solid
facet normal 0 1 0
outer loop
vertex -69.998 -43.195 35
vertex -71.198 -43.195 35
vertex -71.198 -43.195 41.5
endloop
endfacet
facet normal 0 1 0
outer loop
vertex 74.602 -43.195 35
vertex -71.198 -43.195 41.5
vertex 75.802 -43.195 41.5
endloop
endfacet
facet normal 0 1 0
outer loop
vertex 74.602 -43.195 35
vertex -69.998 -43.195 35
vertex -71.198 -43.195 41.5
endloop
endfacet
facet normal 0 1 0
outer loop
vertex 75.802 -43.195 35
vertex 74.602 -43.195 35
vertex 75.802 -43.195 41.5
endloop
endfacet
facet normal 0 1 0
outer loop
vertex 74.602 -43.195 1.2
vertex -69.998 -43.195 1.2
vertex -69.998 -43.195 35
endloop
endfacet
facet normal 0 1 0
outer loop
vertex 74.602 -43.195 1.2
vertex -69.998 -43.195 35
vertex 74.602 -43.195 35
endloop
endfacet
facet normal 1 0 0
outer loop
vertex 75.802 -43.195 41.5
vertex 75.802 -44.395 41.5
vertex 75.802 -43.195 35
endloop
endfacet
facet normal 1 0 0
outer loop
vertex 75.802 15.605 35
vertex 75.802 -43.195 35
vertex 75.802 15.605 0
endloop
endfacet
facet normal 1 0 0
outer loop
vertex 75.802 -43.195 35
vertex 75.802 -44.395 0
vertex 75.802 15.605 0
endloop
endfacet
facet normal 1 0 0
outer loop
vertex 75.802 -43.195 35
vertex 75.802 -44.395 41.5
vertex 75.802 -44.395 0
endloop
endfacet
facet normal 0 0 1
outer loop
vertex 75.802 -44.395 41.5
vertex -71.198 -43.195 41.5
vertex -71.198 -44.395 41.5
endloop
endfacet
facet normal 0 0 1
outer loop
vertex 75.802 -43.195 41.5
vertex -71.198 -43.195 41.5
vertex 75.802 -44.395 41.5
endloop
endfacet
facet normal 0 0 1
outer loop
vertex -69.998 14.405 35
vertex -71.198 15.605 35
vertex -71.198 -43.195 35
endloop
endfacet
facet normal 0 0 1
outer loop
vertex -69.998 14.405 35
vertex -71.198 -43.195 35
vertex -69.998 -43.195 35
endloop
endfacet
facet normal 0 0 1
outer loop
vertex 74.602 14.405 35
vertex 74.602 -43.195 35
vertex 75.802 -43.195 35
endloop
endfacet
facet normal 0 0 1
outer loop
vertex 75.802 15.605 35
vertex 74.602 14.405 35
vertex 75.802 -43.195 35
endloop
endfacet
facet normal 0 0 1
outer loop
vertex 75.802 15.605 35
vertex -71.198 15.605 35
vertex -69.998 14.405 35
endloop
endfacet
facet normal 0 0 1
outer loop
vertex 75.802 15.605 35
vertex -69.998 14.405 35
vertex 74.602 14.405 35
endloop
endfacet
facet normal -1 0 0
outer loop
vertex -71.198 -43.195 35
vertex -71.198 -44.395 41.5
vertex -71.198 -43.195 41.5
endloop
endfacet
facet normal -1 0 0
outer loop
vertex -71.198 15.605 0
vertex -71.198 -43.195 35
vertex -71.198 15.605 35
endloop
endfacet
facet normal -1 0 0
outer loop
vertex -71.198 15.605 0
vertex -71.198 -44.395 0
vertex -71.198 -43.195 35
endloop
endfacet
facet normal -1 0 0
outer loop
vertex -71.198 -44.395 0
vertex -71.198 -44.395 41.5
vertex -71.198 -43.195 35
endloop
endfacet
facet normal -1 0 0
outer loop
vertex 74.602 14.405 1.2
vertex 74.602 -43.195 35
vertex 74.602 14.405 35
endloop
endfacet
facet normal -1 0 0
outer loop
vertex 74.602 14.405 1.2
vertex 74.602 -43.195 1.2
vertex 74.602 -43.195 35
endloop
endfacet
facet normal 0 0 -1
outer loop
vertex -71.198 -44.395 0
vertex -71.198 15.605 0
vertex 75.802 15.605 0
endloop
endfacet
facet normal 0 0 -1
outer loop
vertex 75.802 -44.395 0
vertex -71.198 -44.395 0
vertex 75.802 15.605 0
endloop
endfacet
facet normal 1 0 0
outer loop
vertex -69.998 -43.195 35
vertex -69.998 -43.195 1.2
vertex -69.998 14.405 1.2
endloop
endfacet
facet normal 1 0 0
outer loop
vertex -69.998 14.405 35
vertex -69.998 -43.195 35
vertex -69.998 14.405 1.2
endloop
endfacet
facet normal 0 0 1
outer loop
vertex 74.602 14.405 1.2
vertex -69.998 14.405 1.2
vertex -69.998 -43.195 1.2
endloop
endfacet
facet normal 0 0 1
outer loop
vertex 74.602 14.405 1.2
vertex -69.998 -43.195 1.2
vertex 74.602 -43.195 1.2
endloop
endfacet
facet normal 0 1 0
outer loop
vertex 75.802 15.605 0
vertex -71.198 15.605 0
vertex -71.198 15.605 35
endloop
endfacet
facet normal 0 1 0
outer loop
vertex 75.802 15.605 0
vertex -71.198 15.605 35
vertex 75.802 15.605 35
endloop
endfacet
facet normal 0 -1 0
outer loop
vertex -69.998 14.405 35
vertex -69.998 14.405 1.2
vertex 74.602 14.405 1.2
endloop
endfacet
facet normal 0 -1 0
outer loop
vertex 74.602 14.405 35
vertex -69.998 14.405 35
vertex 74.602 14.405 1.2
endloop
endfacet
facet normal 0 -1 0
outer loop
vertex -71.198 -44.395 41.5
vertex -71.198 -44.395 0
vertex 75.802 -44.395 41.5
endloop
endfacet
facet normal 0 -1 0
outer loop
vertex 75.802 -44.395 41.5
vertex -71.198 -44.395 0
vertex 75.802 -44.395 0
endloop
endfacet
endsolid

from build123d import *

# Parameters (mm, degrees)
F0_W     = 147
F0_H     = 60
F1_DEPTH = 35
F2_W     = 147
F2_H     = 1.6
F3_DEPTH = 6.5
F4_T     = -1.2
F5_DEPTH = 0.4


# Not quite as in the source:
# - a shell that OpenCascade refuses in one call is made with other operations: the cavity is built on its own and cut out


with BuildPart() as f1:
    # F0 (on Top) → F1 (new body)
    with BuildSketch(Plane.XY):
        with Locations((2.3024454713, -14.3951082311)):
            Rectangle(F0_W, F0_H)
    extrude(amount=F1_DEPTH)

    # F2 (on face) → F3 (join)
    with BuildSketch(Plane.XY.offset(35)):
        with Locations((2.3024454713, -43.5951082311)):
            Rectangle(F2_W, F2_H)
    extrude(amount=F3_DEPTH)

    # F4: a shell. OpenCascade refuses it in one call, so the cavity is built on its own and cut out:
    # the body offset inwards by the wall thickness, plus a prism from it out through each open face.
    f4_core = offset(f1.part, amount=F4_T, kind=Kind.INTERSECTION, mode=Mode.PRIVATE)
    f4_exits = [f4_core.faces().sort_by_distance(p)[0] for p in [
        (2.302445, -14.395108, 33.8),
    ]]
    add(f4_core, mode=Mode.SUBTRACT)
    extrude(f4_exits, amount=-F4_T, mode=Mode.SUBTRACT)

    # F5 (cut): a face of the model
    f5_faces = [f1.faces().sort_by_distance(p)[0] for p in [
        (2.3024454713, -42.7951082311, 38.25),
    ]]
    extrude(f5_faces, amount=-F5_DEPTH, mode=Mode.SUBTRACT)


solid = f1.part
